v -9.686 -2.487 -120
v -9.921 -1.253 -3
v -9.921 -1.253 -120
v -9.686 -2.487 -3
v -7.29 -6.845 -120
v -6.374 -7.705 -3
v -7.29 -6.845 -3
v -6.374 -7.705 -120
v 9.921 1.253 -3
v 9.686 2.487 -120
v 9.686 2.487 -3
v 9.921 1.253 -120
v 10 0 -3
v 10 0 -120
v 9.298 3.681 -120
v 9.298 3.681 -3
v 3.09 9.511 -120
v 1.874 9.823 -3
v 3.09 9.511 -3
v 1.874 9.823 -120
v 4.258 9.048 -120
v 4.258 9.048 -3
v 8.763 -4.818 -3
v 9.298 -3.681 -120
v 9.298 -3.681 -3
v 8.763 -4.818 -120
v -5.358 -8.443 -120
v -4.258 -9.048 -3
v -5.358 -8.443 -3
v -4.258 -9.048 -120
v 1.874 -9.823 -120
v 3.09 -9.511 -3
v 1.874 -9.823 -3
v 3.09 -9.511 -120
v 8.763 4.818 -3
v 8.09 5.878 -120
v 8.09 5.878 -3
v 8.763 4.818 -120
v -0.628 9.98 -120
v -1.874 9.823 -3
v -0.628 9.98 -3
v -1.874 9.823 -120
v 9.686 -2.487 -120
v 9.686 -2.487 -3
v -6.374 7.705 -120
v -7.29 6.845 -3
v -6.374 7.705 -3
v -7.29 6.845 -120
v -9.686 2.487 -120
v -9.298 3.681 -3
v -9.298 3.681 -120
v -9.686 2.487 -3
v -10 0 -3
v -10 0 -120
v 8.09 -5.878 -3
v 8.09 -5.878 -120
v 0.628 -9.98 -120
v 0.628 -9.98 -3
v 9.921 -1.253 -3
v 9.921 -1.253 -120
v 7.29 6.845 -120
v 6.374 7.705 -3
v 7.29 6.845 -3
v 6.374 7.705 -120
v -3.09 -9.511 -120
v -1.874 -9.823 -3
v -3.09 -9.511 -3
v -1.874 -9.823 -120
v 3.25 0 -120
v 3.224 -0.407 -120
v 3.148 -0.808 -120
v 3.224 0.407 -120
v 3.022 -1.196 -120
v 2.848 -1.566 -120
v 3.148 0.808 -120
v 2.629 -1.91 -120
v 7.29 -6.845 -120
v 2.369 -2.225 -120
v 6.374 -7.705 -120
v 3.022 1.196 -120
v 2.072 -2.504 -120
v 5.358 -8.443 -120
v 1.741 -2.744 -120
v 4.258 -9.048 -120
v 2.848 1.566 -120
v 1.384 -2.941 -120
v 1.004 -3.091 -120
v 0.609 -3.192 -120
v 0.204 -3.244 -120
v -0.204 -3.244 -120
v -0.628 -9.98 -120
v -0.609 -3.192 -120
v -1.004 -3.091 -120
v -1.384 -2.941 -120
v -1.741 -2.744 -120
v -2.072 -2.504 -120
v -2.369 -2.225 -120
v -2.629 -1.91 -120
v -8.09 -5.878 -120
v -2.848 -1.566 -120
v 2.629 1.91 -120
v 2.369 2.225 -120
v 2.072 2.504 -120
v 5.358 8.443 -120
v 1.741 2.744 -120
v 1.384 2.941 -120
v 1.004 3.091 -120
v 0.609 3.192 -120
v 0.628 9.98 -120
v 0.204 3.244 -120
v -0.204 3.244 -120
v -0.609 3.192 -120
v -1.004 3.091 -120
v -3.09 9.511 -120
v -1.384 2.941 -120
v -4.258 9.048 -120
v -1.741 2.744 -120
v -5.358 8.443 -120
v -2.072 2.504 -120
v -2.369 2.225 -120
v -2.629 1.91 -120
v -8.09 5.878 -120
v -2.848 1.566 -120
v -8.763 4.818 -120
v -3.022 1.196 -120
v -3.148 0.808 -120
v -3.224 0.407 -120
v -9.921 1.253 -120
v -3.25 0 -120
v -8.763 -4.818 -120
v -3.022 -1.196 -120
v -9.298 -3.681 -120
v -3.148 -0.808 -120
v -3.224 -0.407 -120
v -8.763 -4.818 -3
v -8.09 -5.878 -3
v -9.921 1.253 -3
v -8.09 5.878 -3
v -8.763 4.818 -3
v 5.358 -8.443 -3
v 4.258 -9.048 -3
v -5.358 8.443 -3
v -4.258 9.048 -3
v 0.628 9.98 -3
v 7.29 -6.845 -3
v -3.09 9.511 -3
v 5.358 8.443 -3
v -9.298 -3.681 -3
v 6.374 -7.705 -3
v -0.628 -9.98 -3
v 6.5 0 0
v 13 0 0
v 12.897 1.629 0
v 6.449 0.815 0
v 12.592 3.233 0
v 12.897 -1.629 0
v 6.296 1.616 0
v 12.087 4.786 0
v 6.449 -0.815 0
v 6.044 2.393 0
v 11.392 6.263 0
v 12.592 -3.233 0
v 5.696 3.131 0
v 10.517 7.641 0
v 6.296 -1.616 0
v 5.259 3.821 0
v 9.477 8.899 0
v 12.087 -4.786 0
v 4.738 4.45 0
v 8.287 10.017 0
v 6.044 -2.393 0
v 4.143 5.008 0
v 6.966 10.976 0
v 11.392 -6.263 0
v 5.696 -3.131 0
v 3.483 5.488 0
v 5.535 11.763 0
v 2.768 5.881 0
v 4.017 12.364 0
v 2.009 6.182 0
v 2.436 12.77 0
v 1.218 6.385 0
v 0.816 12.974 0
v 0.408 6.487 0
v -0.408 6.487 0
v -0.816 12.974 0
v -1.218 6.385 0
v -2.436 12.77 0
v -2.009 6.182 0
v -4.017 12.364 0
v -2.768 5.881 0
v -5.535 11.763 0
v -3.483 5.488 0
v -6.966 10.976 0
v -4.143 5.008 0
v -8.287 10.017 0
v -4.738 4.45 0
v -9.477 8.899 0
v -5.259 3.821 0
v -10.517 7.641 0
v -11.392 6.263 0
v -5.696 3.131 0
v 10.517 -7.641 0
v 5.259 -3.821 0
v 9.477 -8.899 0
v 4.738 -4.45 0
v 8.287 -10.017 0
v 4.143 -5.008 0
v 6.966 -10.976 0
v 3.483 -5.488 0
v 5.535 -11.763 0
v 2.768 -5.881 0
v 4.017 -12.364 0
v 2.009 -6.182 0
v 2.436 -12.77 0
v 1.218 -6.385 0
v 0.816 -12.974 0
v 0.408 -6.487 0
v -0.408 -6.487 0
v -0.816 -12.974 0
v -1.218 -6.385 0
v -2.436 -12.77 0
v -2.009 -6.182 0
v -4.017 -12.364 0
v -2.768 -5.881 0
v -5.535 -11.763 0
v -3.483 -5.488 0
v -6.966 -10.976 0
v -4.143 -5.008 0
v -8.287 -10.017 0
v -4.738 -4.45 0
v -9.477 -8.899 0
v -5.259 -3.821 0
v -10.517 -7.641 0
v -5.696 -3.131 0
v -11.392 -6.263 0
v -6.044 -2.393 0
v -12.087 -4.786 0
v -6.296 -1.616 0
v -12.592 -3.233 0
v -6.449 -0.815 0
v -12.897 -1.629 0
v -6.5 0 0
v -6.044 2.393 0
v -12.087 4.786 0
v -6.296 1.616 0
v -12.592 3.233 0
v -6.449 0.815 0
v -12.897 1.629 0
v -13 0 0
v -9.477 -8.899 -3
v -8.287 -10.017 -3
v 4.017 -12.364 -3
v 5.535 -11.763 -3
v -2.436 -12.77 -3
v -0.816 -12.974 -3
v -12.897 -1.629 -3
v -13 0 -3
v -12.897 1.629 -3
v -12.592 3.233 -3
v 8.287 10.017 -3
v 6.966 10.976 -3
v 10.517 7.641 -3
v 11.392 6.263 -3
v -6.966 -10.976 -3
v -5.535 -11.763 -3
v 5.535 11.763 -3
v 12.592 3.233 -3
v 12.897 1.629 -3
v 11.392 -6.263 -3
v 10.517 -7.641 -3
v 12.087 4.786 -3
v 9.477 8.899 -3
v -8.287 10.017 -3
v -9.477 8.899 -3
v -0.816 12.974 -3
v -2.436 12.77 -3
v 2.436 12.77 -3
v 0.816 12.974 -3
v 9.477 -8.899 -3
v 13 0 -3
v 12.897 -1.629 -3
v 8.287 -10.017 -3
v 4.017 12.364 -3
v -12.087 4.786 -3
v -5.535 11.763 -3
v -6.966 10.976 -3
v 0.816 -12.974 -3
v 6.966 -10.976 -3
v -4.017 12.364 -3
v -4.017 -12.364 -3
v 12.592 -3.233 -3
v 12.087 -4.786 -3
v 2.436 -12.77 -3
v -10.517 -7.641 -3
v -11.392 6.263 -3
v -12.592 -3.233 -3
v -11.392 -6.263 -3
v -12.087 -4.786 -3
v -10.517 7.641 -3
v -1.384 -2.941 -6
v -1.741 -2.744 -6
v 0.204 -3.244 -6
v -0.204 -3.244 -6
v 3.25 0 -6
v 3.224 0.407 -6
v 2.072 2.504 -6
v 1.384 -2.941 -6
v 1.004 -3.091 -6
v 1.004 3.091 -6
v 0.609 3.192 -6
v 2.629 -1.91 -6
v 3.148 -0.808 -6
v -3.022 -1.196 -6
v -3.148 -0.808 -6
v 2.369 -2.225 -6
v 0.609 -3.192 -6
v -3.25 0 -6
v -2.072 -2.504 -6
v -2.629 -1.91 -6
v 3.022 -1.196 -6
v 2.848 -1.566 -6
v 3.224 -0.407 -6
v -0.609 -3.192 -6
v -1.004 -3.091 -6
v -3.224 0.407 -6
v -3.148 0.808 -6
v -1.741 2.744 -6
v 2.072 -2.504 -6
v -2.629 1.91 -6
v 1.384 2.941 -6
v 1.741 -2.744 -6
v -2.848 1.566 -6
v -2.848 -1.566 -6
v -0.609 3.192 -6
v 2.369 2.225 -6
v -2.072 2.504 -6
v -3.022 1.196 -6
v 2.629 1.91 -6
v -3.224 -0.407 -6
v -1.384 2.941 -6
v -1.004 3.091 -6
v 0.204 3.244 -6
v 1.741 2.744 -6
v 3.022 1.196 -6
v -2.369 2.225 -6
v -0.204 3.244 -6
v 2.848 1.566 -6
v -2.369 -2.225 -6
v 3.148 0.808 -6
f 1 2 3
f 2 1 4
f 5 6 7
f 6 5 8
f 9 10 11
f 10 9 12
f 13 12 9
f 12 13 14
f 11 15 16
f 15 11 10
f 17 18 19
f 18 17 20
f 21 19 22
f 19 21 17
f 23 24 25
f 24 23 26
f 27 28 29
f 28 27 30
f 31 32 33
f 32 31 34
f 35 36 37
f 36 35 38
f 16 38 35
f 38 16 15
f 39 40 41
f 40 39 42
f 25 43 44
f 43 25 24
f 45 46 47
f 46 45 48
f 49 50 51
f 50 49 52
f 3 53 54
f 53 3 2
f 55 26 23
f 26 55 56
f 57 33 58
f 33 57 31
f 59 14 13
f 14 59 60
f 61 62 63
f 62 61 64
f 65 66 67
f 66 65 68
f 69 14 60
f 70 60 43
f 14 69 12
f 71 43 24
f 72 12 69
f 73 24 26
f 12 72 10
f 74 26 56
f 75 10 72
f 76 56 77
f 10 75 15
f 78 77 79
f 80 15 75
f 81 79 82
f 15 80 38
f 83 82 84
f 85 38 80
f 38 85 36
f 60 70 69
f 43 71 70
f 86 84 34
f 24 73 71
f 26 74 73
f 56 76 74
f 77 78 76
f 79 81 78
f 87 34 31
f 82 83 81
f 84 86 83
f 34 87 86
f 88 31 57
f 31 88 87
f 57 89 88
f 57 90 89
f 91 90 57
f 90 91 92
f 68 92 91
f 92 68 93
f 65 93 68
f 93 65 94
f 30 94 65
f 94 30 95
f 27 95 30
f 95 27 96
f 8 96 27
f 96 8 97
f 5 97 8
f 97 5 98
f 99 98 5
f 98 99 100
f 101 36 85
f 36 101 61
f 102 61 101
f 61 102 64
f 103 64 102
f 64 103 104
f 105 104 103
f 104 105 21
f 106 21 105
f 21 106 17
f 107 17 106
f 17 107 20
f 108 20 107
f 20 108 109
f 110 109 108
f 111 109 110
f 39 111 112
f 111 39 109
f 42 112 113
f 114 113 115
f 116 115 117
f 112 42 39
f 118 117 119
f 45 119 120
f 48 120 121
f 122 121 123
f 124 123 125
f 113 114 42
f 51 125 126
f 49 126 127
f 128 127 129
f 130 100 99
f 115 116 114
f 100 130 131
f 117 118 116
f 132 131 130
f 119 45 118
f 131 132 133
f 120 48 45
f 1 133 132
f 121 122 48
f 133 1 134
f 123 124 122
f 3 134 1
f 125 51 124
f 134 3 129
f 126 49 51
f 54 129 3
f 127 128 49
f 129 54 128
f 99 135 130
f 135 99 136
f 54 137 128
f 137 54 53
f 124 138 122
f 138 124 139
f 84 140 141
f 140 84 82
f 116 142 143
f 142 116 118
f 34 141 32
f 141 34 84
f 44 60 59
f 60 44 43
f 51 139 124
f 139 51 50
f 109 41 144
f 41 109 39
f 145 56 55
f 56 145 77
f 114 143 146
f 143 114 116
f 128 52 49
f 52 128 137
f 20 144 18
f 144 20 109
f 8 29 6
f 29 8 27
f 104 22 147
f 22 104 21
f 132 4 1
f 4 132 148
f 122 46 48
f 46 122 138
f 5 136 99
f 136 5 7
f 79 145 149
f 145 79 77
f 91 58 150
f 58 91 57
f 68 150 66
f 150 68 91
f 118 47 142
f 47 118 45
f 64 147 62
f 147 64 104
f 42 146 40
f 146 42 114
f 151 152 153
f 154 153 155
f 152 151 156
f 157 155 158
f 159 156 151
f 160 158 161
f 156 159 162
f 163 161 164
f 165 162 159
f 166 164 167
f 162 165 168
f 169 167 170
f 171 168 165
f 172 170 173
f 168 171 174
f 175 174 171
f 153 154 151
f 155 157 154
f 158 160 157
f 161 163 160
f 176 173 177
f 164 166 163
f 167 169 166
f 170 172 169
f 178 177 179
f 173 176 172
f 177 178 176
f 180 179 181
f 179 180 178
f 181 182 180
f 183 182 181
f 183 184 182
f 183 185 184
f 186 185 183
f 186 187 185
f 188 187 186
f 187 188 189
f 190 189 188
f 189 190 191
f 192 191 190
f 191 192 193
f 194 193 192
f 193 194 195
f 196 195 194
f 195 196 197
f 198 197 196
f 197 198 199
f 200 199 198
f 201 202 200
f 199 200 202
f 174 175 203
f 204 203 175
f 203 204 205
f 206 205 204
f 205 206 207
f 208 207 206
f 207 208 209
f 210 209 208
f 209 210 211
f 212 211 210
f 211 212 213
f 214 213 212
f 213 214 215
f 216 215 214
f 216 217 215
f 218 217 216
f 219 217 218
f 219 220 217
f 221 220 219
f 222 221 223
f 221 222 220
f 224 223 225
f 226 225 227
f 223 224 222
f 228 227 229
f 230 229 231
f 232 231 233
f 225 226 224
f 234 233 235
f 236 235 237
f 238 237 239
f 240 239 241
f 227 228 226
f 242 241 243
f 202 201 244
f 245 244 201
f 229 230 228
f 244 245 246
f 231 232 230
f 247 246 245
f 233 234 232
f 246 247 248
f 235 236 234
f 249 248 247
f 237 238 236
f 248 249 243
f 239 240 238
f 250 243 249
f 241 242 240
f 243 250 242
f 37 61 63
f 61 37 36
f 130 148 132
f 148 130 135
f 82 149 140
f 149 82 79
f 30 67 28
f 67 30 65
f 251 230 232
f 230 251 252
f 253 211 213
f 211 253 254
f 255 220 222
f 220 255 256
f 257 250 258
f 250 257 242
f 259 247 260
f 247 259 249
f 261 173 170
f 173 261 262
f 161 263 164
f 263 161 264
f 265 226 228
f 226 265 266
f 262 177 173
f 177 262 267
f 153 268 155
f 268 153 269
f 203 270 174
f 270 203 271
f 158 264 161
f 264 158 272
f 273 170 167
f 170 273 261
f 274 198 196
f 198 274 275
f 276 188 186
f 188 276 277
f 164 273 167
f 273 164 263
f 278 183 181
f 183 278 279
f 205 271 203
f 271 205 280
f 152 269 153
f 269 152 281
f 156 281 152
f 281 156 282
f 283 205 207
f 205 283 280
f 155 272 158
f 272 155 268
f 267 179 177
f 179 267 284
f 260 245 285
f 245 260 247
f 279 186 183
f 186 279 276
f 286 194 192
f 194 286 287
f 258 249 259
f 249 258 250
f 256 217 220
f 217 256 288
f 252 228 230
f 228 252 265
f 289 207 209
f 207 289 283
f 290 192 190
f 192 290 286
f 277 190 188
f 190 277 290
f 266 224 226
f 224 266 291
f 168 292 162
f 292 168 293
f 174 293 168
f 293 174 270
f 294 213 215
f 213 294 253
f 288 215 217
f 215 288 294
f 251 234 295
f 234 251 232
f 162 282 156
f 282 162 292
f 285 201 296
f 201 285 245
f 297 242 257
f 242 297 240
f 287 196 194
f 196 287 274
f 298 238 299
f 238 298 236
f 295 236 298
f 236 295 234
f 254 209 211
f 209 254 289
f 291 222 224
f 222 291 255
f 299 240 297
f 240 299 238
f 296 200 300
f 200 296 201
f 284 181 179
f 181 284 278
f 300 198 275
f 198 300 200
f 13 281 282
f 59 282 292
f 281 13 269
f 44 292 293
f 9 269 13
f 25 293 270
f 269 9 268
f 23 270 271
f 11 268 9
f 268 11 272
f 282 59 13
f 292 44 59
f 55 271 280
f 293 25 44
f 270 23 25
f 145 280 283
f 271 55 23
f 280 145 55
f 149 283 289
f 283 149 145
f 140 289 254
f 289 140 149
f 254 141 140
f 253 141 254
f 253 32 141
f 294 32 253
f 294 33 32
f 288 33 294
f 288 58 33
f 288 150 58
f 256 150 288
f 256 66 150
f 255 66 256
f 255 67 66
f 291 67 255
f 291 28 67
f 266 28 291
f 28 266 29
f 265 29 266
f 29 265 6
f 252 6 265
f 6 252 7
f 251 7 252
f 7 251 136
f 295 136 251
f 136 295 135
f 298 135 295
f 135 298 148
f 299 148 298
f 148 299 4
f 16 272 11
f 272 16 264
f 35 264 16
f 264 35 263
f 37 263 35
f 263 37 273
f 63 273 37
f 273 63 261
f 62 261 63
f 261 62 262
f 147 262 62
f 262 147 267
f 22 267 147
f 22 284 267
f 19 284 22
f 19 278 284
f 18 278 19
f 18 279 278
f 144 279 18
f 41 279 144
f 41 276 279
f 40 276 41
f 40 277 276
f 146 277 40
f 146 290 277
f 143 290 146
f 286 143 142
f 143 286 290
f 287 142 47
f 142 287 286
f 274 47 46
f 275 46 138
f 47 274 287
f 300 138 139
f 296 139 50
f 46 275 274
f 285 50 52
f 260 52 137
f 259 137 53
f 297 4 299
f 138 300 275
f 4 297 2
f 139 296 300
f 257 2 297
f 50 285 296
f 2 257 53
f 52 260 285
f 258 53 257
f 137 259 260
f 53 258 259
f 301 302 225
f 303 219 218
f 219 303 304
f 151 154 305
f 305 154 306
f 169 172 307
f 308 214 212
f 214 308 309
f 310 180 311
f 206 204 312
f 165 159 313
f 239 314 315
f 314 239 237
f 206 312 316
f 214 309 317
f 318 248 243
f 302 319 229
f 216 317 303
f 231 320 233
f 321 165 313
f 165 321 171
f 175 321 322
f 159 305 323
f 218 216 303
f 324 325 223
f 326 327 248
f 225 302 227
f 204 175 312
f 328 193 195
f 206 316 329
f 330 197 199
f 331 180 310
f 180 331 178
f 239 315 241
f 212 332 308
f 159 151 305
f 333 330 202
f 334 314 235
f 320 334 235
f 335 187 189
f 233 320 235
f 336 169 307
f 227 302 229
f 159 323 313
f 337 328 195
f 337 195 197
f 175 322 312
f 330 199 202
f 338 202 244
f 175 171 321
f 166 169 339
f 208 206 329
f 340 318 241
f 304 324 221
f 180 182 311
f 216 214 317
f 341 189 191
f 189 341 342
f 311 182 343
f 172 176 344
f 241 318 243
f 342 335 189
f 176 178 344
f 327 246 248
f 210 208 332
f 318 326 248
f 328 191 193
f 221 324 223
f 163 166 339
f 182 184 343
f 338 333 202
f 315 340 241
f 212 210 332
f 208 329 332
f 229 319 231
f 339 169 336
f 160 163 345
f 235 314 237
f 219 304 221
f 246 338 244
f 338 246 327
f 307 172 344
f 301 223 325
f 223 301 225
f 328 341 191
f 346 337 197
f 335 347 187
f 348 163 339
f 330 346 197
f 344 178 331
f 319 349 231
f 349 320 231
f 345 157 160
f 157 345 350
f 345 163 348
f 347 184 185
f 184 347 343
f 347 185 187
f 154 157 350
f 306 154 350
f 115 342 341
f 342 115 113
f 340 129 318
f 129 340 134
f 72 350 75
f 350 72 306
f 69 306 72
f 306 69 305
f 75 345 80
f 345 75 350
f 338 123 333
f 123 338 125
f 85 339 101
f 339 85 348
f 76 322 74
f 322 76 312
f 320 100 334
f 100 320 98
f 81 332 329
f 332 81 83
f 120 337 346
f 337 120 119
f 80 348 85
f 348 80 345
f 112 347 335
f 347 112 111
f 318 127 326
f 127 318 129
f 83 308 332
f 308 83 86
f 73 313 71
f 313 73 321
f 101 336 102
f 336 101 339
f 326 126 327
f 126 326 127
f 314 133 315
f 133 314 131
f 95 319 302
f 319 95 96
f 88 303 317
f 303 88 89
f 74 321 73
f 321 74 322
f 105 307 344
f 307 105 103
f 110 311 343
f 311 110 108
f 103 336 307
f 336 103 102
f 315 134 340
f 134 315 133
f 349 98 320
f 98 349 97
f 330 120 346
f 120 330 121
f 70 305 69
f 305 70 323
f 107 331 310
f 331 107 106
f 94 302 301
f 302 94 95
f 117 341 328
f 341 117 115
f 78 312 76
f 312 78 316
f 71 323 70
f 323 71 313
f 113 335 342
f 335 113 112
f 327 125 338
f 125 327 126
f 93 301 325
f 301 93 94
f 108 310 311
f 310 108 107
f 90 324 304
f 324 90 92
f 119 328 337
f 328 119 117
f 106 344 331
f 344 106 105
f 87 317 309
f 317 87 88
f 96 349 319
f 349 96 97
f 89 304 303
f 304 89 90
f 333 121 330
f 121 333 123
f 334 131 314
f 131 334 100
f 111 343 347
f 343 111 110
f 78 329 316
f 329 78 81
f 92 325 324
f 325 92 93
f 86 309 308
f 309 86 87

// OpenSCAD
$fn = 50;


difference() {
	union() {
		translate(v = [0, 0, -120.0000000000]) {
			cylinder(h = 120, r = 10.0000000000);
		}
		translate(v = [0, 0, -3.0000000000]) {
			cylinder(h = 3, r = 13.0000000000);
		}
	}
	union() {
		translate(v = [0, 0, 0]) {
			rotate(a = [0, 0, 0]) {
				difference() {
					union() {
						#translate(v = [0, 0, -120.0000000000]) {
							cylinder(h = 120, r = 2.2500000000);
						}
						#translate(v = [0, 0, -6]) {
							cylinder(h = 6, r = 10.0000000000, r1 = 3.2500000000, r2 = 6.5000000000);
						}
						#translate(v = [0, 0, -120.0000000000]) {
							cylinder(h = 120, r = 3.2500000000);
						}
						#translate(v = [0, 0, -120.0000000000]) {
							cylinder(h = 120, r = 2.2500000000);
						}
					}
					union();
				}
			}
		}
	}
}
